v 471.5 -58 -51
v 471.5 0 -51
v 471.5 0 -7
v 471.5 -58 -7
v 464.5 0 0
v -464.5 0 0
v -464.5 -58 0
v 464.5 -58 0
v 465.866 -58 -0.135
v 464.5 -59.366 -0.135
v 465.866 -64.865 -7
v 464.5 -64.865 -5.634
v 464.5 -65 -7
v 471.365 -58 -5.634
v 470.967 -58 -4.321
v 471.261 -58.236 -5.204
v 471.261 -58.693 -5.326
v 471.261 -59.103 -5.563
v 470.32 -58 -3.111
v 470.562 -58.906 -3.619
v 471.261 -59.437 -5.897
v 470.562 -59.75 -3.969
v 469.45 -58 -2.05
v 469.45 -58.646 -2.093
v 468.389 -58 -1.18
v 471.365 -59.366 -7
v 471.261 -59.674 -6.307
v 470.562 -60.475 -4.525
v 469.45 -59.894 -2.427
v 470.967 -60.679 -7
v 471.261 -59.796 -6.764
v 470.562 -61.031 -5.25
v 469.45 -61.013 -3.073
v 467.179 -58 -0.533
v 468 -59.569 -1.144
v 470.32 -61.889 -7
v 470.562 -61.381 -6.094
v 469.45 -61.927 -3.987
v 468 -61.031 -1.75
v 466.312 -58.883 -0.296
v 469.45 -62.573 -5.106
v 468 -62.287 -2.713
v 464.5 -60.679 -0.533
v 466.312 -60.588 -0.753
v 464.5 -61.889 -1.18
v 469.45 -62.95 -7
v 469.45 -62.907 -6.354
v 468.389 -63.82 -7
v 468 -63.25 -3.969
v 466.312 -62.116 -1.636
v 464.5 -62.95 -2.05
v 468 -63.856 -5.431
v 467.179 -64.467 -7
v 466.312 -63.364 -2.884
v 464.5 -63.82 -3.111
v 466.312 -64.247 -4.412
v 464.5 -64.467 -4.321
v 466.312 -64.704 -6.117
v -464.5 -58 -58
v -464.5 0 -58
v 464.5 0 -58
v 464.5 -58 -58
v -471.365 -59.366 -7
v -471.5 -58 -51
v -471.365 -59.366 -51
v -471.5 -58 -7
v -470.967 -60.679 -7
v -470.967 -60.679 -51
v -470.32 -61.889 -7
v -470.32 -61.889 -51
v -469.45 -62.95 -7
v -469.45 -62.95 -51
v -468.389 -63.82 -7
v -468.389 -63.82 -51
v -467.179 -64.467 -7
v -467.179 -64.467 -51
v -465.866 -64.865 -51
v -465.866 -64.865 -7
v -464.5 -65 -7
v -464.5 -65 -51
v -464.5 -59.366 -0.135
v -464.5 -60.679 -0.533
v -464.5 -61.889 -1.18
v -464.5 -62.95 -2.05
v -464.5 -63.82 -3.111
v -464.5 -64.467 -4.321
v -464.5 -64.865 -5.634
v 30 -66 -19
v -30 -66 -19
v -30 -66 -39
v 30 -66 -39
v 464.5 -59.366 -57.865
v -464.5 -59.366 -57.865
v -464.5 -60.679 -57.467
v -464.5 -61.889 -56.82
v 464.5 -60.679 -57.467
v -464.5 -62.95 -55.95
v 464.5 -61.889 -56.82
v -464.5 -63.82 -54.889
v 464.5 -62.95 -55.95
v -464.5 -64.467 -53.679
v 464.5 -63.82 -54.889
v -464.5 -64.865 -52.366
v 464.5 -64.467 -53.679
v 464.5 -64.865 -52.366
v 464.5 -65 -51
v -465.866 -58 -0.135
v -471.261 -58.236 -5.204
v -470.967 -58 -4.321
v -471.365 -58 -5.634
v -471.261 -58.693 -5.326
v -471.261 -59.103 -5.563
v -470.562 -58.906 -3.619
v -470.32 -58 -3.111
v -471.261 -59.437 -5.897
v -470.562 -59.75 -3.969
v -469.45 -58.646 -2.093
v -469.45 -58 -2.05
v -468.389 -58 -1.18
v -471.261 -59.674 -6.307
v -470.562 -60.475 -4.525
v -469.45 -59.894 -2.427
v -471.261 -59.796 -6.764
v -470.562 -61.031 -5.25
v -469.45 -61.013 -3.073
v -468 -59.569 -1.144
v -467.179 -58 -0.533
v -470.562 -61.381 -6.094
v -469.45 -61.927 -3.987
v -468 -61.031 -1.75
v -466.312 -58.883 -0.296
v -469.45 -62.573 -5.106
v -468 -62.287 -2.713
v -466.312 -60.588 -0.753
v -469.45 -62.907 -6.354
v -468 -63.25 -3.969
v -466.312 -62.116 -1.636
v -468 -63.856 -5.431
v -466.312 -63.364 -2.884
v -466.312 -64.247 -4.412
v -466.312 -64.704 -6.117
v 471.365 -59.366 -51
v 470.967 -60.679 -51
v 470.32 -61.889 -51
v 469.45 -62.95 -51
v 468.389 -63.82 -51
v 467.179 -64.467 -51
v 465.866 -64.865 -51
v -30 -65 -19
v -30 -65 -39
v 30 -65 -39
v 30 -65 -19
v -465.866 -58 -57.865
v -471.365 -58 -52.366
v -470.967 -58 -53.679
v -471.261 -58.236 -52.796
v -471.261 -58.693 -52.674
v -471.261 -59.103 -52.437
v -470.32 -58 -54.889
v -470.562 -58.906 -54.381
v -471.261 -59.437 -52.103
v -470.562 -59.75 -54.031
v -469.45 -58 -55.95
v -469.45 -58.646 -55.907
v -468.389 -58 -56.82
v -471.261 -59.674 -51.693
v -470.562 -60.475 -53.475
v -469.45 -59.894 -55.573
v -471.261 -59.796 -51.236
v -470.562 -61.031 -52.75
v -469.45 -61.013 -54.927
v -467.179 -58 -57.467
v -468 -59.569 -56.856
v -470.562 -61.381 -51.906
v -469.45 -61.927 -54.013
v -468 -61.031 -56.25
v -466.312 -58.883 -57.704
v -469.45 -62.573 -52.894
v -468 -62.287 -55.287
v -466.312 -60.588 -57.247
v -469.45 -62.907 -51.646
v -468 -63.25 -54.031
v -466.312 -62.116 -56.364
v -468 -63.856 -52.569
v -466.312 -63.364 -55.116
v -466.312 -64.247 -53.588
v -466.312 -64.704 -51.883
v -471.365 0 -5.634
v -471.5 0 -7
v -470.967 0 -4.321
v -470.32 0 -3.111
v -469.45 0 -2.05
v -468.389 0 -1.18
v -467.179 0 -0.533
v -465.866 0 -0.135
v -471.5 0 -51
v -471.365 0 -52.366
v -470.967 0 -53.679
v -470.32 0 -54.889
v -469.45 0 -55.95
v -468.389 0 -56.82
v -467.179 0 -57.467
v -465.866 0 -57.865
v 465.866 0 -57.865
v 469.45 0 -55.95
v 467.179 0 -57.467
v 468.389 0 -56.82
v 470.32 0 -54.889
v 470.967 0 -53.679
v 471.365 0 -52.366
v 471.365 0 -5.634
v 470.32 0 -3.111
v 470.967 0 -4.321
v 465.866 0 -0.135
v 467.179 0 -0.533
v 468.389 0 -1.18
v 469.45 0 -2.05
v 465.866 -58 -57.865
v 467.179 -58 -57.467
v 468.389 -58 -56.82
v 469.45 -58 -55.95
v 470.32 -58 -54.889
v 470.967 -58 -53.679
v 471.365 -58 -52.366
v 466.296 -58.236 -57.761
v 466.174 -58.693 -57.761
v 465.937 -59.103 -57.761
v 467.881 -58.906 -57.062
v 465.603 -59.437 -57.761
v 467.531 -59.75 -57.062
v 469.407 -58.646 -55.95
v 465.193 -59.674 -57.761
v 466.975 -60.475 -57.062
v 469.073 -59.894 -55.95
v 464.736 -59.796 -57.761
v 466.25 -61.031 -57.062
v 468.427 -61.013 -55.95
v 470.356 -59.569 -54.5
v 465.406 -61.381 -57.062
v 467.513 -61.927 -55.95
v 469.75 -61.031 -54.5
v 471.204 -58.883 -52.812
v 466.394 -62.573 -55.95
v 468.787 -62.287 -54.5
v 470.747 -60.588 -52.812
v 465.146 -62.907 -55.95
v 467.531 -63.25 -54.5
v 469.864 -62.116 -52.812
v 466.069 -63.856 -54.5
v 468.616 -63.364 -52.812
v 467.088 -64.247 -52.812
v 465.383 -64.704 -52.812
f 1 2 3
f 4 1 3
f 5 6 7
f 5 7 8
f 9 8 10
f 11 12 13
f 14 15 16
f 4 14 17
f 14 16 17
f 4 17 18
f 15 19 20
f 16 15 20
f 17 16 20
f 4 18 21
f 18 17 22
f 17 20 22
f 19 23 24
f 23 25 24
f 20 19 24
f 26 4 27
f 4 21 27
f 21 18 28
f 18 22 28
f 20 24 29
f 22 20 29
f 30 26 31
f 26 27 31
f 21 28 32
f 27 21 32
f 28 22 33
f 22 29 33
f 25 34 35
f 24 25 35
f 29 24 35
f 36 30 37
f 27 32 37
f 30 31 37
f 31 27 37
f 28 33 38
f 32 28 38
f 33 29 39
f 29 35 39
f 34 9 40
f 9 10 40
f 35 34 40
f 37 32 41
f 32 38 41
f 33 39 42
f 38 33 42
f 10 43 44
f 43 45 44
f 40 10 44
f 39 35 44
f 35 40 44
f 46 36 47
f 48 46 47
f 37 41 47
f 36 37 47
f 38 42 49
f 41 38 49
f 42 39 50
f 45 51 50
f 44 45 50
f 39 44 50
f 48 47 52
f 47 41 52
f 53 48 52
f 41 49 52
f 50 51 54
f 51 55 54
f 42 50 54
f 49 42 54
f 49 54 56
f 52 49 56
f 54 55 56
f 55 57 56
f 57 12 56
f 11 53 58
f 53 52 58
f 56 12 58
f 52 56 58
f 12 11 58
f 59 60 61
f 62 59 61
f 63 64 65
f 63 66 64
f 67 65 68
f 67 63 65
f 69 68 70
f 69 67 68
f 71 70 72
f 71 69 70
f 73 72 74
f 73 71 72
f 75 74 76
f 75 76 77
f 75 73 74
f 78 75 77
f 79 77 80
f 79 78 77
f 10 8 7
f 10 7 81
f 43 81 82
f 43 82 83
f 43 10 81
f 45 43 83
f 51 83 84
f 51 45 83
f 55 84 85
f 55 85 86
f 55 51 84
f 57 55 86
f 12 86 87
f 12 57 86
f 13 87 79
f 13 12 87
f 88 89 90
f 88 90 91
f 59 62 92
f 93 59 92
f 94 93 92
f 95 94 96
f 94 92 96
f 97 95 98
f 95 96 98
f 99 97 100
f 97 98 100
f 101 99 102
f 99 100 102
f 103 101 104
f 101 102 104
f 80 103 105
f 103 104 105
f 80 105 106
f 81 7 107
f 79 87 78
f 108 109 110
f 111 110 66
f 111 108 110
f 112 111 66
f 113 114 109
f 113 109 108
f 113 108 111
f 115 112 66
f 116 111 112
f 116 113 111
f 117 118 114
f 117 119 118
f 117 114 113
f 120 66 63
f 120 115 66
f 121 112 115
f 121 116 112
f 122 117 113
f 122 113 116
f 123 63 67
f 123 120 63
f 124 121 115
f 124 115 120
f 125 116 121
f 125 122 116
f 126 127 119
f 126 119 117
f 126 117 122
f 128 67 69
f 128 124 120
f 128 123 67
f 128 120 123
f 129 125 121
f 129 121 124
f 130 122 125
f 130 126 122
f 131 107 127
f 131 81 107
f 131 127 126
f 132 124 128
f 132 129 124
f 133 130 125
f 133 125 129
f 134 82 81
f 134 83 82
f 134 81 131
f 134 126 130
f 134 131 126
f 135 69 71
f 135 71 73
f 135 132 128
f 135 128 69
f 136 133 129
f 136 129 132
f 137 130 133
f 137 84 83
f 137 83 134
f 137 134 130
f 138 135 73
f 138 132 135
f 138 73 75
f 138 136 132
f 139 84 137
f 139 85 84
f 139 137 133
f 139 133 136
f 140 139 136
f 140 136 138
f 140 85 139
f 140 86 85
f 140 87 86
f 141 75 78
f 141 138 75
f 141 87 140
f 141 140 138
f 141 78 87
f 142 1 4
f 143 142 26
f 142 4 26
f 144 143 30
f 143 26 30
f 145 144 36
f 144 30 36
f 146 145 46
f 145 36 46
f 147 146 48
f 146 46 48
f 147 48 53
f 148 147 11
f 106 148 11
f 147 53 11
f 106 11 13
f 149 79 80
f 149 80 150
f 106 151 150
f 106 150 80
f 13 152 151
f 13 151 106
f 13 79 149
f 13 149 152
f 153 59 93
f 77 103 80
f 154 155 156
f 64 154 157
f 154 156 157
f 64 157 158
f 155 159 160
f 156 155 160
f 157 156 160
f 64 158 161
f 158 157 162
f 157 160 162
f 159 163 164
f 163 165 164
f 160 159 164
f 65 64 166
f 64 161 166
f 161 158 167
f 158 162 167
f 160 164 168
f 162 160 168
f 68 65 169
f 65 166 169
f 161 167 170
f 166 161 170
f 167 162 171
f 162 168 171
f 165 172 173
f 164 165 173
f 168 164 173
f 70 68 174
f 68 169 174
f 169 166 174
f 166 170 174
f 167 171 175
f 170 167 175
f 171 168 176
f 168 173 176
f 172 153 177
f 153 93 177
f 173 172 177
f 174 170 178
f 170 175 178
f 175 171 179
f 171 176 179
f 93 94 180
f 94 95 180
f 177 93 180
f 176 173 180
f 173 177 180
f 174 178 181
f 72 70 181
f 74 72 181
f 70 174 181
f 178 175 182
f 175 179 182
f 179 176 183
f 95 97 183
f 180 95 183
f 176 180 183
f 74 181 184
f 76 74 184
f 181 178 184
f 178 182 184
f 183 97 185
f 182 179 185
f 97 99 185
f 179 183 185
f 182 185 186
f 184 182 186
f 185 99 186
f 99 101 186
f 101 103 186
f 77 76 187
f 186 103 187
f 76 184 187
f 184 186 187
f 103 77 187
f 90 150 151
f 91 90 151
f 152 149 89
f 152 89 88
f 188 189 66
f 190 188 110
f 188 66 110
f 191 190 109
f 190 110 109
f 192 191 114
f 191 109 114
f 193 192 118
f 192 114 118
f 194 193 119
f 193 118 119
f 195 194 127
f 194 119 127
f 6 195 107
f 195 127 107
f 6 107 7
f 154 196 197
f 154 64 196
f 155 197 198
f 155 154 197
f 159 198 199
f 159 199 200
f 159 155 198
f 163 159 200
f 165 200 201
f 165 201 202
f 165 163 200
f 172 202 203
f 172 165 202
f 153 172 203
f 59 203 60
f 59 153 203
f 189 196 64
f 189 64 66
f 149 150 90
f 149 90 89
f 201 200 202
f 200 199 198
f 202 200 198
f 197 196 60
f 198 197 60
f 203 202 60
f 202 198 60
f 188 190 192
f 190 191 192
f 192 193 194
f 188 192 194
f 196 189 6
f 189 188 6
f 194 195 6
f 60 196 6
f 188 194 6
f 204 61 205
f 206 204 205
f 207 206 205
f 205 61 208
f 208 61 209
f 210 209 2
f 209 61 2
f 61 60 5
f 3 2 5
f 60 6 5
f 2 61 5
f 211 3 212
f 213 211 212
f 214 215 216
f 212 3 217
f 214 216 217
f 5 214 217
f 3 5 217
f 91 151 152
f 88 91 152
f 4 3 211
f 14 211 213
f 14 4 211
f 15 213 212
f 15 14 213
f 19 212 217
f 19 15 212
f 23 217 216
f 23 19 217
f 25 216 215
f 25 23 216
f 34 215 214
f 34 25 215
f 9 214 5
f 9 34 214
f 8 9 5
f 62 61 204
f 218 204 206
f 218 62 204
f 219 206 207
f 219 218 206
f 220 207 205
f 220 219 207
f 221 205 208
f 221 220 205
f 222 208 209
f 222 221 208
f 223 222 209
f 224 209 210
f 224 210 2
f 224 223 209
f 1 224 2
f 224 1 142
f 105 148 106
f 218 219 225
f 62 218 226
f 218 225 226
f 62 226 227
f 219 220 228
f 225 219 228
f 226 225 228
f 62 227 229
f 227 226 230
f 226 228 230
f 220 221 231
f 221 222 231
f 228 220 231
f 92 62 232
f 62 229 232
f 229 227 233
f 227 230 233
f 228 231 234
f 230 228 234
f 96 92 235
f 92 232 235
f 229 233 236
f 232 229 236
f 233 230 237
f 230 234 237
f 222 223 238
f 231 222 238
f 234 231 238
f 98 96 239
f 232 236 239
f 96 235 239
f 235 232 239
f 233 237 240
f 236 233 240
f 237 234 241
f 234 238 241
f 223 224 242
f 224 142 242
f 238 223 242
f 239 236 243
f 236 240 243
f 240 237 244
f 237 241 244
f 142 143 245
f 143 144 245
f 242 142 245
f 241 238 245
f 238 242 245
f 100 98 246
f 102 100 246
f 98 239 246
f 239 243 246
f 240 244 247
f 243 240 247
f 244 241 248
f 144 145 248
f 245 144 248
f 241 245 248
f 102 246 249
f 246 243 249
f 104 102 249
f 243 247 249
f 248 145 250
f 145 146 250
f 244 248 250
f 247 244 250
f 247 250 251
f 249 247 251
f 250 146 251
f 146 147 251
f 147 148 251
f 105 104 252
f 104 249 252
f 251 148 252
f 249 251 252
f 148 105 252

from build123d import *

# Parameters (mm, degrees)
F0_W     = 943
F0_H     = 58
F1_DEPTH = 65
F2_R     = 7
F3_W     = 60
F3_H     = 20
F4_DEPTH = 1


with BuildPart() as f1:
    # F0 (on Front) → F1 (new body)
    with BuildSketch(Plane.XZ):
        with Locations((0, -29)):
            Rectangle(F0_W, F0_H)
    extrude(amount=F1_DEPTH)

    # F2
    f2_edges = [f1.edges().sort_by_distance(p)[0] for p in [
        (0, -65, 0),
        (471.5, -32.5, 0),
        (471.5, -65, -29),
        (471.5, -32.5, -58),
        (0, -65, -58),
        (-471.5, -32.5, 0),
        (-471.5, -32.5, -58),
        (-471.5, -65, -29),
    ]]
    fillet(f2_edges, radius=F2_R)

    # F3 (on face) → F4 (join)
    with BuildSketch(Plane.XZ.offset(65)):
        with Locations((0, -29)):
            Rectangle(F3_W, F3_H)
    extrude(amount=F4_DEPTH)


solid = f1.part
